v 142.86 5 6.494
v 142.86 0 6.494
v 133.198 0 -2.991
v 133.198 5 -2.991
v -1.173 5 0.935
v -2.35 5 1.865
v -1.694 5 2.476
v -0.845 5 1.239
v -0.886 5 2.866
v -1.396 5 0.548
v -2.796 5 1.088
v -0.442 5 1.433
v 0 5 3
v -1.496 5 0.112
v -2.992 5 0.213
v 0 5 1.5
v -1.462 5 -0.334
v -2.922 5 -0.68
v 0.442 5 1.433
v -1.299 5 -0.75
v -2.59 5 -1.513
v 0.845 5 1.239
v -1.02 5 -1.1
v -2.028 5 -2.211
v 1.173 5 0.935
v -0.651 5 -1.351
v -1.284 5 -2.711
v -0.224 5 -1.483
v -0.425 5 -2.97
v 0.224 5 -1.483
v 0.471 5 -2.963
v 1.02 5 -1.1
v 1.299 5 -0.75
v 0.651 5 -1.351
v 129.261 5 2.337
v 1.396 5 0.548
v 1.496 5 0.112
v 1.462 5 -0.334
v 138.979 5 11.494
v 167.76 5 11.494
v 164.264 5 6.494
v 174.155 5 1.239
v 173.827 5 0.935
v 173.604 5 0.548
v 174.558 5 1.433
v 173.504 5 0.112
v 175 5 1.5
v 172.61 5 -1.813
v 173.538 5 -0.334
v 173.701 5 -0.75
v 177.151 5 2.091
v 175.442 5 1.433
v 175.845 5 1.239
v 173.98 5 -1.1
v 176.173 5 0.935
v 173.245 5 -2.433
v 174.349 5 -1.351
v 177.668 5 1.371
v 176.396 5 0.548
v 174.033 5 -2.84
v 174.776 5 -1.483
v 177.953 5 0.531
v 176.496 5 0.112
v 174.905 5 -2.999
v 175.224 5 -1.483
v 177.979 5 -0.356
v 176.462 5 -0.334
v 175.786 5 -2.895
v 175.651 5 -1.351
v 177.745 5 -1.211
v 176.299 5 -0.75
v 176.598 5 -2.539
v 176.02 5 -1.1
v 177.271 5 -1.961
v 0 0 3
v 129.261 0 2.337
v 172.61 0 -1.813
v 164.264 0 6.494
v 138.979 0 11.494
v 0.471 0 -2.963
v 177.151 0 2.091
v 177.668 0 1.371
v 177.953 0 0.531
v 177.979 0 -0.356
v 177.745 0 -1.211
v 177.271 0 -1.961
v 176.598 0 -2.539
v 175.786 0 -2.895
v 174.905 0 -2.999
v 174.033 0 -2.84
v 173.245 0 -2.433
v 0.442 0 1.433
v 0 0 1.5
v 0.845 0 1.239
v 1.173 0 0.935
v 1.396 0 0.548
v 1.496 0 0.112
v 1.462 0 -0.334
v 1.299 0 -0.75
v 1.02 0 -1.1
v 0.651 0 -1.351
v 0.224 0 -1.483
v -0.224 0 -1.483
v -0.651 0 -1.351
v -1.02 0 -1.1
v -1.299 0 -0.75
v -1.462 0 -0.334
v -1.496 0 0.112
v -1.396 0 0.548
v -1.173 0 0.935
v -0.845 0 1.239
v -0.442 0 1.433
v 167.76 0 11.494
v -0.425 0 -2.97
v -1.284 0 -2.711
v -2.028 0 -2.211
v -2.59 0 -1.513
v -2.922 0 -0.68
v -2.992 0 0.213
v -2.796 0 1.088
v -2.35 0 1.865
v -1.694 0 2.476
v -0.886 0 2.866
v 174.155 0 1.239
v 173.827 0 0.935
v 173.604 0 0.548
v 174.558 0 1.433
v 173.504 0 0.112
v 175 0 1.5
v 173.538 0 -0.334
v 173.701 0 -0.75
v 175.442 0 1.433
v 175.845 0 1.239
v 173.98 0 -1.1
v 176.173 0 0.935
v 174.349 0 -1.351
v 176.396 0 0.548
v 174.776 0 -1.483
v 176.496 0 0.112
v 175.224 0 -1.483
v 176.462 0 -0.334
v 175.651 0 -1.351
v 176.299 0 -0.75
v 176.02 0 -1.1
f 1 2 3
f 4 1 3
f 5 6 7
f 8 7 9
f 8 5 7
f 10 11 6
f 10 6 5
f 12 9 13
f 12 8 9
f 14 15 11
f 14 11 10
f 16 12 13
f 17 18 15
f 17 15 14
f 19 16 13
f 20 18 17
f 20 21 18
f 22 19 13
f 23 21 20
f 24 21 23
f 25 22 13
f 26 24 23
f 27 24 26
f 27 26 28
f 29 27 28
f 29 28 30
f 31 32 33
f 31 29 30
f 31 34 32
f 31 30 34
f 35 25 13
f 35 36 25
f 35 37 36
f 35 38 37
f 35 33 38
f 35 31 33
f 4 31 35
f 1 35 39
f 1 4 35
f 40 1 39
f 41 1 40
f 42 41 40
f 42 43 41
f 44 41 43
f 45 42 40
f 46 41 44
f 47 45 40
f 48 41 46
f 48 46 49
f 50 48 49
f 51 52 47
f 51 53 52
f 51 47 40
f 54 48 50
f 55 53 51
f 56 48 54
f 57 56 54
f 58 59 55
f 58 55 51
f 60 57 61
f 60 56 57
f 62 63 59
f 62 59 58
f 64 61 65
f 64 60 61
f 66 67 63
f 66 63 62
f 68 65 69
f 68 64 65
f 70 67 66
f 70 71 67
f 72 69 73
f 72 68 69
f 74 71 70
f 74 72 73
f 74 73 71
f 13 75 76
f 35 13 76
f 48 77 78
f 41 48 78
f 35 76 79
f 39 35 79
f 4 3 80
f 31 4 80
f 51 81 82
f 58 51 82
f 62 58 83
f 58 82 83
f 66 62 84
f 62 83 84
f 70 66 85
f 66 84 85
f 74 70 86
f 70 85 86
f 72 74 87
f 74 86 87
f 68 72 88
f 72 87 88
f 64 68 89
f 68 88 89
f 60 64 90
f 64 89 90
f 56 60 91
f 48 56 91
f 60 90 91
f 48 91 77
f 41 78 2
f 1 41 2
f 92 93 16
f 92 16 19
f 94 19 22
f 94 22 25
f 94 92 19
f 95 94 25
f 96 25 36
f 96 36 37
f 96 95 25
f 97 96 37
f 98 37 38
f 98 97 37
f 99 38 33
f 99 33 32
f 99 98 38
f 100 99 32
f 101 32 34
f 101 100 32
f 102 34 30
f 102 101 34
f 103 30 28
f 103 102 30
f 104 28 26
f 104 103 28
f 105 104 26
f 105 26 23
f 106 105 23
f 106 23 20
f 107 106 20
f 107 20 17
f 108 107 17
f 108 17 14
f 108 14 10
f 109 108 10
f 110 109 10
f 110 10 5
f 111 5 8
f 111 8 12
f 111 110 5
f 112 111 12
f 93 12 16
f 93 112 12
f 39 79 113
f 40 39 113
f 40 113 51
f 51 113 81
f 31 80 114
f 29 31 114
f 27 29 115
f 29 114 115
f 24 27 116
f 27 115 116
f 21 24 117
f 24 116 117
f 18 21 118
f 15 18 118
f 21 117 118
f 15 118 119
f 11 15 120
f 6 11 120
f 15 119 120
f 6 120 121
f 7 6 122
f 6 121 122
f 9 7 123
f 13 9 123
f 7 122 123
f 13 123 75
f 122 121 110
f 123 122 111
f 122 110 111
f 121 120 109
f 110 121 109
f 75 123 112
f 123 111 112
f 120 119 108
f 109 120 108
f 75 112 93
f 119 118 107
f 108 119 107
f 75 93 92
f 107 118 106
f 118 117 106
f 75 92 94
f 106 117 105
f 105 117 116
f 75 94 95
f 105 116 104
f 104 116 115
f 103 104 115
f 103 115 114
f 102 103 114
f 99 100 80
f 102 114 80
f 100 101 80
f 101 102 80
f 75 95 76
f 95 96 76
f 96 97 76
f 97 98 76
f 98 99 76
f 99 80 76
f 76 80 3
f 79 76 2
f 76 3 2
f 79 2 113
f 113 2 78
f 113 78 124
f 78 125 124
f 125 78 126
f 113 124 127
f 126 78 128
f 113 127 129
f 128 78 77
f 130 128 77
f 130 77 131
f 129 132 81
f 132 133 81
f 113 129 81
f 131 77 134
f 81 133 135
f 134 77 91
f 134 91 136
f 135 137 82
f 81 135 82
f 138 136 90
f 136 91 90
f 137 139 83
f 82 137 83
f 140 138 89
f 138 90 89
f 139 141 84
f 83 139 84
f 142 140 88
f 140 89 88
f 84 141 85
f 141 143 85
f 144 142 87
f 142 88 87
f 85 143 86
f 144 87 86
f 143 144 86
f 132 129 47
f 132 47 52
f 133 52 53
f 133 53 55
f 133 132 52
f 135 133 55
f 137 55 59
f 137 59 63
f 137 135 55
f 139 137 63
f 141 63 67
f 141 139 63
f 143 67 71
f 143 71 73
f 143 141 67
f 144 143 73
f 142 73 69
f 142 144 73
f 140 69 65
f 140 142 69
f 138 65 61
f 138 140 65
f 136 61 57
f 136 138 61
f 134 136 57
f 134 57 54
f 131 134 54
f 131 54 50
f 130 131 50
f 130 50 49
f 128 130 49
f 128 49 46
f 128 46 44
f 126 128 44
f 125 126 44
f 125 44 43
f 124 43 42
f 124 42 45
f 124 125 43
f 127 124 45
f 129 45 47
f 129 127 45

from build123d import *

# Parameters (mm, degrees)
CROQUIS1_R              = 1.5
SALIENTE_EXTRUIR1_DEPTH = 5


with BuildPart() as part:
    # Croquis1 → Saliente-Extruir1 (new body)
    with BuildSketch(Plane(origin=(0, 0, 0), x_dir=(1, 0, 0), z_dir=(0, 1, 0))):
        with BuildLine():
            Line((0, -3), (129.261088854, -2.336866912))
            Line((129.261088854, -2.336866912), (138.979125155, -11.494366527))
            Line((138.979125155, -11.494366527), (167.76042343, -11.494366527))
            Line((167.76042343, -11.494366527), (177.151035775, -2.091182702))
            ThreePointArc((177.151035775, -2.091182702), (176.95596642, 2.274685773), (172.610149506, 1.813453781))
            Line((172.610149506, 1.813453781), (164.264425587, -6.494366527))
            Line((164.264425587, -6.494366527), (142.859531648, -6.494366527))
            Line((142.859531648, -6.494366527), (133.197849193, 2.991093014))
            Line((133.197849193, 2.991093014), (0.470896611, 2.962812242))
            ThreePointArc((0.470896611, 2.962812242), (-2.99068861, 0.236181365), (0, -3))
        make_face()
        with Locations(Location((0, 0, 0), (0, 0, 270))):
            Circle(CROQUIS1_R, mode=Mode.SUBTRACT)
        with Locations(Location((175, 0, 0), (0, 0, 270))):
            Circle(CROQUIS1_R, mode=Mode.SUBTRACT)
    extrude(amount=SALIENTE_EXTRUIR1_DEPTH)


solid = part.part
